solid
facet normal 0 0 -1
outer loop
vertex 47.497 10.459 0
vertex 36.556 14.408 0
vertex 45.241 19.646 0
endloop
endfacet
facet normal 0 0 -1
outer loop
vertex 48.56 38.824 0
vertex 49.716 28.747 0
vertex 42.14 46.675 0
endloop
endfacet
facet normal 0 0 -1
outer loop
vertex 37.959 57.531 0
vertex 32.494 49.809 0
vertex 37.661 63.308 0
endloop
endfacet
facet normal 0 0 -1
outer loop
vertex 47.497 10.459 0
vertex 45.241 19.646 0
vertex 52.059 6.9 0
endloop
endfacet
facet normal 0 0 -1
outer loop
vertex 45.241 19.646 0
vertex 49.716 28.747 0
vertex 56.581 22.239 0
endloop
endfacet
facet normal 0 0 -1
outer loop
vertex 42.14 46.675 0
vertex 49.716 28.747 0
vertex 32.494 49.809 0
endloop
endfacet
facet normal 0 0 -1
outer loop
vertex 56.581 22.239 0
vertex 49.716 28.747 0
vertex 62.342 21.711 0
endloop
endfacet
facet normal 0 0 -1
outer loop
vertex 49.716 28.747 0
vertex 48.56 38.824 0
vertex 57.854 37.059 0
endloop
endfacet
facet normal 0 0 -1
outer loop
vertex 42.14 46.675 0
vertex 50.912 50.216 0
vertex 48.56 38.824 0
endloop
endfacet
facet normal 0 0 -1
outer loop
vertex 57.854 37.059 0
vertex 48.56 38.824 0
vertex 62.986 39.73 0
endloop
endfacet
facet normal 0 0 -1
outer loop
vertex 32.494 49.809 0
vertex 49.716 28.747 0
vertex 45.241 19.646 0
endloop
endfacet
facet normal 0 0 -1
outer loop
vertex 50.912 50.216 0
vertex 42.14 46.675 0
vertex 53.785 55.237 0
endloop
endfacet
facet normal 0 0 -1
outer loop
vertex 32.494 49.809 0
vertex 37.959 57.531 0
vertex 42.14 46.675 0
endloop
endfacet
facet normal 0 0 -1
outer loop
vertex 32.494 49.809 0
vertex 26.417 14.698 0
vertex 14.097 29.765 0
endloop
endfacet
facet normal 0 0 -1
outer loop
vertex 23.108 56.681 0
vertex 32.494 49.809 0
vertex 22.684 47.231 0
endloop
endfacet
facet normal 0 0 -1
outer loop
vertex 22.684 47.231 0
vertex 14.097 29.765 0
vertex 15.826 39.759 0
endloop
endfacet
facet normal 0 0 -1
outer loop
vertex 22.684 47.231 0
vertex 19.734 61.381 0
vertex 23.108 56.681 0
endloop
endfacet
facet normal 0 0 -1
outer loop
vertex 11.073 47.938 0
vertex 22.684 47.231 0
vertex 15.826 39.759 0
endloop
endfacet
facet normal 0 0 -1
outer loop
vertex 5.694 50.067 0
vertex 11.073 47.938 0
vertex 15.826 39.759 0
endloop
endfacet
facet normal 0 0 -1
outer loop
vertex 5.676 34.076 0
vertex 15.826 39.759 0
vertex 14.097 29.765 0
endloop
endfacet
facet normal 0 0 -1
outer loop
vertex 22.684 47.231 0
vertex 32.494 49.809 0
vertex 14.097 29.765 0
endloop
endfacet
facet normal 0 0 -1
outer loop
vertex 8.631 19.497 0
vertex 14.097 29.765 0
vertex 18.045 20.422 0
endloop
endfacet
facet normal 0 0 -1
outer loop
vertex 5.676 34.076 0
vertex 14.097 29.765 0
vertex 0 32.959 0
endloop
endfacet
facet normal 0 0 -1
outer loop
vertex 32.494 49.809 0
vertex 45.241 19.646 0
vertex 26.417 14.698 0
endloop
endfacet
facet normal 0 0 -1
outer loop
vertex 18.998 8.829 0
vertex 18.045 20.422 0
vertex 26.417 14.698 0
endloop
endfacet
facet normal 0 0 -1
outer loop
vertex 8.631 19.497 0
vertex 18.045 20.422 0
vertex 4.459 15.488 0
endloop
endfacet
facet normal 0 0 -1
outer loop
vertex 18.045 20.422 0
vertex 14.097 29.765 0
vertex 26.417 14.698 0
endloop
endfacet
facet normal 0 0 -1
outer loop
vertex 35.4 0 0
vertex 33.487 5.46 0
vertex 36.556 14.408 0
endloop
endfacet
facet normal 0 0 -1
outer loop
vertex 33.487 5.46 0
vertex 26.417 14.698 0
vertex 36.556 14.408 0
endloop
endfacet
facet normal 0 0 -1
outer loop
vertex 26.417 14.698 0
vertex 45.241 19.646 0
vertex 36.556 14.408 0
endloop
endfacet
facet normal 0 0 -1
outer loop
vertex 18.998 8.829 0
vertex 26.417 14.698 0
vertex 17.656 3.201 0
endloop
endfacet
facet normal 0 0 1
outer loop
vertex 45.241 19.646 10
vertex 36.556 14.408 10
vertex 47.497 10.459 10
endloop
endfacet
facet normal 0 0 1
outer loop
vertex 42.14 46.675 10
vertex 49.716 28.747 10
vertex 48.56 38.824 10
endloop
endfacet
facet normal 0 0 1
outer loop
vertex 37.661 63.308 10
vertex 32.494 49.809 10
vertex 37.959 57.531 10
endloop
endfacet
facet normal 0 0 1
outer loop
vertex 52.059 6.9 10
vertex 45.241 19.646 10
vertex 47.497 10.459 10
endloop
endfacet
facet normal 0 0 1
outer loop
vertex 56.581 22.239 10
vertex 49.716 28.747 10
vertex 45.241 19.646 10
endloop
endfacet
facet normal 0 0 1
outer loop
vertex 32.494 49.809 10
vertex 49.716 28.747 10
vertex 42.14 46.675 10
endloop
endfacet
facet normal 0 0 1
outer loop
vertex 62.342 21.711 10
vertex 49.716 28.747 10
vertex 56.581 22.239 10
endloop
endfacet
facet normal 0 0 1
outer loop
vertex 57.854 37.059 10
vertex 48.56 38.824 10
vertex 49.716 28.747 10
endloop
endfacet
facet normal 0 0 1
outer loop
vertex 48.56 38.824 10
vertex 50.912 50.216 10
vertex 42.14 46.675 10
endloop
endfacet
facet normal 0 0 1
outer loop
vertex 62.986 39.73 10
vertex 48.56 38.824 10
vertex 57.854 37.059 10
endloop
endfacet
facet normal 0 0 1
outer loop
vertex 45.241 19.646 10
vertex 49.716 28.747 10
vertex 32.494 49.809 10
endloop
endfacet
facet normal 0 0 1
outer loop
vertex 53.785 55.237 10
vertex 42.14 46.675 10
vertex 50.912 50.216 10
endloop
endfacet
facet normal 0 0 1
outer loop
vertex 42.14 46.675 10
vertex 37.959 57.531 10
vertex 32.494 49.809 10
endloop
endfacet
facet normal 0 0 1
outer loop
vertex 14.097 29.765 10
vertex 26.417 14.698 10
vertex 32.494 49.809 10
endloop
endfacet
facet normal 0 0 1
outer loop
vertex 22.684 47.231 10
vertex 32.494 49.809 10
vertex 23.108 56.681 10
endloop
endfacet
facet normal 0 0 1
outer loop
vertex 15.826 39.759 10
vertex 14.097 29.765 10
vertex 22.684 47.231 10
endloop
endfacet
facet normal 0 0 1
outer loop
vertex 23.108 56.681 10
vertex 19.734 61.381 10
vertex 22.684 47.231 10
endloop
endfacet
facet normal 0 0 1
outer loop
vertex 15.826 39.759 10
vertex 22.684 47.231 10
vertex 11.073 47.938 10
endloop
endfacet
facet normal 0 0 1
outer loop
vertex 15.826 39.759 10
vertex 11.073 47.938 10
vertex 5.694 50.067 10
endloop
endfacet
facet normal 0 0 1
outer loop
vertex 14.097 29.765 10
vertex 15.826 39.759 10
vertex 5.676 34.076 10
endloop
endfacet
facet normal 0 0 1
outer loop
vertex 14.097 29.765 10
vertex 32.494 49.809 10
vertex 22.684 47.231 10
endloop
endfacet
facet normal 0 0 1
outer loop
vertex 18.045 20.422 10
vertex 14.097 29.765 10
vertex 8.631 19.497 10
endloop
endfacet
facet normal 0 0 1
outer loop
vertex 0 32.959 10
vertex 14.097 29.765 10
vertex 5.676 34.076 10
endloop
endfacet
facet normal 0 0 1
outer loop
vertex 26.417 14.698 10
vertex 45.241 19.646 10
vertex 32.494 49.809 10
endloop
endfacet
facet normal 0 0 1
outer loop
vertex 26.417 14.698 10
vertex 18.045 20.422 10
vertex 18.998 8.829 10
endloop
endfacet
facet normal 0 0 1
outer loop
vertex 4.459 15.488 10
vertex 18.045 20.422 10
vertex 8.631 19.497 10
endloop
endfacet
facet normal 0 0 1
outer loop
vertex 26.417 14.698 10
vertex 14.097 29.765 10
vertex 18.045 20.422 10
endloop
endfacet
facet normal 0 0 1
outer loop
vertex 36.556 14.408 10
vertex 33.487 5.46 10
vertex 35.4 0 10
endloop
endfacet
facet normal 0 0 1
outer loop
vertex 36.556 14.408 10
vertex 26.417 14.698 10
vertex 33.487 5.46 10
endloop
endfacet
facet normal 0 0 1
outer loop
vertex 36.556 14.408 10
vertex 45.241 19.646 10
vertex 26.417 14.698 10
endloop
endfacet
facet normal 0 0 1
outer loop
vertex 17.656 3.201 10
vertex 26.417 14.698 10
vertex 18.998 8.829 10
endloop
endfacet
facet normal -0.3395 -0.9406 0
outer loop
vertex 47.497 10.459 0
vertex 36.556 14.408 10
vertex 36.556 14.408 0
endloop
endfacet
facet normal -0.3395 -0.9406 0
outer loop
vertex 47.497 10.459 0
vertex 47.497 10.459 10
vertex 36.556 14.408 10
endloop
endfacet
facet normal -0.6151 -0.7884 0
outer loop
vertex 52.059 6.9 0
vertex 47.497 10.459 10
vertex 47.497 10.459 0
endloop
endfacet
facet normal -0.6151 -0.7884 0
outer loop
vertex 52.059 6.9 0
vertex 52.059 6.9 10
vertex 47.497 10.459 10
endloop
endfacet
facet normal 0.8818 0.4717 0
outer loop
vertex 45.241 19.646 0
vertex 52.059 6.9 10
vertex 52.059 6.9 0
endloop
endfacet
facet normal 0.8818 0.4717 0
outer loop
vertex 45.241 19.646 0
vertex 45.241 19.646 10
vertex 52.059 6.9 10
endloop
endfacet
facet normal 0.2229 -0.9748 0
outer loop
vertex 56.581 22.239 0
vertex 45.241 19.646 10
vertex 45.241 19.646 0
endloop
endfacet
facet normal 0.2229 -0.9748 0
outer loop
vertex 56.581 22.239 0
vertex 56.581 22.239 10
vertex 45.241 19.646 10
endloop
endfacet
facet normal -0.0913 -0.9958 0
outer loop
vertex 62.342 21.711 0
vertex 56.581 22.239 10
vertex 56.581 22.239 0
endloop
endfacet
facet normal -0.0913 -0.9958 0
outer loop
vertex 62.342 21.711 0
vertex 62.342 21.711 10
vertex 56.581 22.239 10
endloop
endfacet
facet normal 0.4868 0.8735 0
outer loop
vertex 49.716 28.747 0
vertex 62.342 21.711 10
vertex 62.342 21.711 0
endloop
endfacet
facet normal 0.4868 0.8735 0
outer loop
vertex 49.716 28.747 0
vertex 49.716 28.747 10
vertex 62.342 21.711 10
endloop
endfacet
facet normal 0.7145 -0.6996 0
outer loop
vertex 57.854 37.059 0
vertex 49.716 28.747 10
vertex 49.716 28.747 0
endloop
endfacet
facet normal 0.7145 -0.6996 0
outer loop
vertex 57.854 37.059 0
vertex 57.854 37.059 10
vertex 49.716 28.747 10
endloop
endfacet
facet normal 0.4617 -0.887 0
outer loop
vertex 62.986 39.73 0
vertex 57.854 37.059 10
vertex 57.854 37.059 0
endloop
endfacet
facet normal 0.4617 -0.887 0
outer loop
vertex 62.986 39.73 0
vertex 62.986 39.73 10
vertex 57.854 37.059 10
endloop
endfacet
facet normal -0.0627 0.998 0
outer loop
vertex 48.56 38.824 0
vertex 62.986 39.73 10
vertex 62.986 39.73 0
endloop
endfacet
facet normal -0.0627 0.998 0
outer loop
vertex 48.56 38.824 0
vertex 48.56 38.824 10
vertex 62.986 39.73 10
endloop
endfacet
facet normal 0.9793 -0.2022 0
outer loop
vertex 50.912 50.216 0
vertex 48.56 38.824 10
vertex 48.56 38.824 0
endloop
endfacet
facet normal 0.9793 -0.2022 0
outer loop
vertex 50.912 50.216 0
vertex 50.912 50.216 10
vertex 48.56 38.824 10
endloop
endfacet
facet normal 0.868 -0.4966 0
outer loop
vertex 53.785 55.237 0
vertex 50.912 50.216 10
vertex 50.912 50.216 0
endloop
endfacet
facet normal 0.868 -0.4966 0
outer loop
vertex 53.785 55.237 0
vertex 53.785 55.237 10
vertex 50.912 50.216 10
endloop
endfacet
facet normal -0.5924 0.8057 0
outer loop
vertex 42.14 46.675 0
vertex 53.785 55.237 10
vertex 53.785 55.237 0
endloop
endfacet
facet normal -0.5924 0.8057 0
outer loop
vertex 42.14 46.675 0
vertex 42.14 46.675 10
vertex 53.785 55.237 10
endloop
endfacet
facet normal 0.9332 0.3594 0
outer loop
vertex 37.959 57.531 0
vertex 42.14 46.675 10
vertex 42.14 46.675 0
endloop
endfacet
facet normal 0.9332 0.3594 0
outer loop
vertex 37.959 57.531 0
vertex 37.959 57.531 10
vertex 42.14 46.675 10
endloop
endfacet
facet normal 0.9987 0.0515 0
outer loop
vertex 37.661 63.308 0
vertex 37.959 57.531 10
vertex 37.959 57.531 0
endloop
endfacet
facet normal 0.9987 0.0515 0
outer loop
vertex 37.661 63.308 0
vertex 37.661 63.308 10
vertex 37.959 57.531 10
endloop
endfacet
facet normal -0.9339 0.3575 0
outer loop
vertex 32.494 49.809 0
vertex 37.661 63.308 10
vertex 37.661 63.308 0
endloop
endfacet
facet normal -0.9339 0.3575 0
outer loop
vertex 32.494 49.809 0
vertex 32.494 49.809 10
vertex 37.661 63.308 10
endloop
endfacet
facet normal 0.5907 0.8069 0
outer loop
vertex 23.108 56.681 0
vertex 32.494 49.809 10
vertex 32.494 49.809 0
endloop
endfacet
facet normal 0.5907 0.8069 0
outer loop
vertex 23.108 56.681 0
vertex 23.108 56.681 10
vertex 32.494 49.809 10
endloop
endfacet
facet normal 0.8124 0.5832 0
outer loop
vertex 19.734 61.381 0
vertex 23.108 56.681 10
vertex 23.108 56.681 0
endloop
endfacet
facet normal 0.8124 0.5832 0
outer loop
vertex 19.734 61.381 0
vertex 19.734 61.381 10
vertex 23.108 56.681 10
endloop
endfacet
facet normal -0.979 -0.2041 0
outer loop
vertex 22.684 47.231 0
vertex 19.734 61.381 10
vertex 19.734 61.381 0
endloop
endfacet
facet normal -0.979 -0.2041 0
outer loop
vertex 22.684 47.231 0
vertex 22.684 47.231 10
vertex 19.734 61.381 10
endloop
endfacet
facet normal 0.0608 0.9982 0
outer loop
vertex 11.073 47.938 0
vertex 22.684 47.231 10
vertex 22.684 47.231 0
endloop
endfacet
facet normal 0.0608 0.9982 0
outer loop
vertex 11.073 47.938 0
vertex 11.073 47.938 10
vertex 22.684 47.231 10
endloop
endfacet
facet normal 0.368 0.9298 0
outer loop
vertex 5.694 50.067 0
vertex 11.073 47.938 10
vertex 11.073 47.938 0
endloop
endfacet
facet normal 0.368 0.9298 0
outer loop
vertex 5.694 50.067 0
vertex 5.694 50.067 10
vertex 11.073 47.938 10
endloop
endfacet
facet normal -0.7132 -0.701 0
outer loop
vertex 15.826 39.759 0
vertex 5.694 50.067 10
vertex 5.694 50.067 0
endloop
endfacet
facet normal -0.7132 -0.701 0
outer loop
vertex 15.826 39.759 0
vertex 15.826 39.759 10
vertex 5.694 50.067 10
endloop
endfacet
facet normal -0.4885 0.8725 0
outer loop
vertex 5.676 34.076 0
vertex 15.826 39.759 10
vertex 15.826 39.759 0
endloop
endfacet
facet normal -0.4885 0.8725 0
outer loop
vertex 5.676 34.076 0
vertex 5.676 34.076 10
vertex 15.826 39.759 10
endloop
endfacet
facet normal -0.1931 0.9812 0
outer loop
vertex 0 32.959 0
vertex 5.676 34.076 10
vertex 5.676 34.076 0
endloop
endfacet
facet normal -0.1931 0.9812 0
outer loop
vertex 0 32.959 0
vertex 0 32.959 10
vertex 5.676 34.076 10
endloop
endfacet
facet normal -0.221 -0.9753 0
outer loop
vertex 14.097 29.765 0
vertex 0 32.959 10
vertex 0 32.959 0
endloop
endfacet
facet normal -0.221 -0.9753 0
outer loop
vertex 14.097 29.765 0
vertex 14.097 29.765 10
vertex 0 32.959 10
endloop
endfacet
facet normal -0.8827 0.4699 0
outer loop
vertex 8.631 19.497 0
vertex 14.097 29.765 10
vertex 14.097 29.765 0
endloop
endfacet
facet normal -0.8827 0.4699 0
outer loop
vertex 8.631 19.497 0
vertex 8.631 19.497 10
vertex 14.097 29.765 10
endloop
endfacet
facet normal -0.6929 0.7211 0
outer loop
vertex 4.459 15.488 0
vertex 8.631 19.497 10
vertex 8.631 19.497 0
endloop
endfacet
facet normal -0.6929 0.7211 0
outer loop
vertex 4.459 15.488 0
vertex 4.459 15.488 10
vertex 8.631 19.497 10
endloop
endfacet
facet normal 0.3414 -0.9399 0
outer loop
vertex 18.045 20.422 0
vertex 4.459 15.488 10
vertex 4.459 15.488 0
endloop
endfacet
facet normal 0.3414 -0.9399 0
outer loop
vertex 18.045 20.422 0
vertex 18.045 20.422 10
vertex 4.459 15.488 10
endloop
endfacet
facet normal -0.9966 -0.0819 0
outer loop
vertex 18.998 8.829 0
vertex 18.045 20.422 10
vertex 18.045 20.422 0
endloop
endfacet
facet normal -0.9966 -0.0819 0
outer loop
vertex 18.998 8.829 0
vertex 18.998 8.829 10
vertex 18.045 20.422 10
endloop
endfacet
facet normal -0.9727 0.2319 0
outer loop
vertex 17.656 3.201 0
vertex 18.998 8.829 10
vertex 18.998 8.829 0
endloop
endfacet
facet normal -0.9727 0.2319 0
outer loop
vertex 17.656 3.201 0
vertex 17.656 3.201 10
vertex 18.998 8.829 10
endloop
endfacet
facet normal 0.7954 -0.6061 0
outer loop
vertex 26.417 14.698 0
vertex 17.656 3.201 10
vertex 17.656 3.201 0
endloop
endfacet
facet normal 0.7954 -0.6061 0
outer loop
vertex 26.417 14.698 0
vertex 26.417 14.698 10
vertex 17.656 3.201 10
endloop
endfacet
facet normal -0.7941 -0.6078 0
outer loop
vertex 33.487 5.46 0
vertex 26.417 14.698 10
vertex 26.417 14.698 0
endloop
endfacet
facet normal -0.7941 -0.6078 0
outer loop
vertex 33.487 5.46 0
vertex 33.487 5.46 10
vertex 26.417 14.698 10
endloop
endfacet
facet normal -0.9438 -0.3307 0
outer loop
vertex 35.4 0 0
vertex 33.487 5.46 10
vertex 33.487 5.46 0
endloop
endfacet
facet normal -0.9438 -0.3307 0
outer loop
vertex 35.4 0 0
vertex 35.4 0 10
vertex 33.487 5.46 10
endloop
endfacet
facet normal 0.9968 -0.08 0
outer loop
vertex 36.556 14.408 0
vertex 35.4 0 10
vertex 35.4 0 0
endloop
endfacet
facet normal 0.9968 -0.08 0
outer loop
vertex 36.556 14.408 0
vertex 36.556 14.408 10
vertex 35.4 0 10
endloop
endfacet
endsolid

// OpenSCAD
$fn = 32;

// ----------------------------------------------------------------------
// Fan rotor section: 11 blades, 18 mm hub radius, 14 mm blades
// ----------------------------------------------------------------------

// --- parameters (mm) ---
profile_height = 10;      // extrusion height
profile_points = 33;      // points of the closed outline

profile = [[49.716, 28.747], [57.854, 37.059], [62.986, 39.73], [48.56, 38.824], [50.912, 50.216], [53.785, 55.237], [42.14, 46.675], [37.959, 57.531], [37.661, 63.308], [32.494, 49.809], [23.108, 56.681], [19.734, 61.381], [22.684, 47.231], [11.073, 47.938], [5.694, 50.067], [15.826, 39.759], [5.676, 34.076], [0, 32.959], [14.097, 29.765], [8.631, 19.497], [4.459, 15.488], [18.045, 20.422], [18.998, 8.829], [17.656, 3.201], [26.417, 14.698], [33.487, 5.46], [35.4, 0], [36.556, 14.408], [47.497, 10.459], [52.059, 6.9], [45.241, 19.646], [56.581, 22.239], [62.342, 21.711]];  // single closed polygon, 33 points, counter clockwise

// --- the one profile operation ---
linear_extrude(height = profile_height) polygon(points = profile);
